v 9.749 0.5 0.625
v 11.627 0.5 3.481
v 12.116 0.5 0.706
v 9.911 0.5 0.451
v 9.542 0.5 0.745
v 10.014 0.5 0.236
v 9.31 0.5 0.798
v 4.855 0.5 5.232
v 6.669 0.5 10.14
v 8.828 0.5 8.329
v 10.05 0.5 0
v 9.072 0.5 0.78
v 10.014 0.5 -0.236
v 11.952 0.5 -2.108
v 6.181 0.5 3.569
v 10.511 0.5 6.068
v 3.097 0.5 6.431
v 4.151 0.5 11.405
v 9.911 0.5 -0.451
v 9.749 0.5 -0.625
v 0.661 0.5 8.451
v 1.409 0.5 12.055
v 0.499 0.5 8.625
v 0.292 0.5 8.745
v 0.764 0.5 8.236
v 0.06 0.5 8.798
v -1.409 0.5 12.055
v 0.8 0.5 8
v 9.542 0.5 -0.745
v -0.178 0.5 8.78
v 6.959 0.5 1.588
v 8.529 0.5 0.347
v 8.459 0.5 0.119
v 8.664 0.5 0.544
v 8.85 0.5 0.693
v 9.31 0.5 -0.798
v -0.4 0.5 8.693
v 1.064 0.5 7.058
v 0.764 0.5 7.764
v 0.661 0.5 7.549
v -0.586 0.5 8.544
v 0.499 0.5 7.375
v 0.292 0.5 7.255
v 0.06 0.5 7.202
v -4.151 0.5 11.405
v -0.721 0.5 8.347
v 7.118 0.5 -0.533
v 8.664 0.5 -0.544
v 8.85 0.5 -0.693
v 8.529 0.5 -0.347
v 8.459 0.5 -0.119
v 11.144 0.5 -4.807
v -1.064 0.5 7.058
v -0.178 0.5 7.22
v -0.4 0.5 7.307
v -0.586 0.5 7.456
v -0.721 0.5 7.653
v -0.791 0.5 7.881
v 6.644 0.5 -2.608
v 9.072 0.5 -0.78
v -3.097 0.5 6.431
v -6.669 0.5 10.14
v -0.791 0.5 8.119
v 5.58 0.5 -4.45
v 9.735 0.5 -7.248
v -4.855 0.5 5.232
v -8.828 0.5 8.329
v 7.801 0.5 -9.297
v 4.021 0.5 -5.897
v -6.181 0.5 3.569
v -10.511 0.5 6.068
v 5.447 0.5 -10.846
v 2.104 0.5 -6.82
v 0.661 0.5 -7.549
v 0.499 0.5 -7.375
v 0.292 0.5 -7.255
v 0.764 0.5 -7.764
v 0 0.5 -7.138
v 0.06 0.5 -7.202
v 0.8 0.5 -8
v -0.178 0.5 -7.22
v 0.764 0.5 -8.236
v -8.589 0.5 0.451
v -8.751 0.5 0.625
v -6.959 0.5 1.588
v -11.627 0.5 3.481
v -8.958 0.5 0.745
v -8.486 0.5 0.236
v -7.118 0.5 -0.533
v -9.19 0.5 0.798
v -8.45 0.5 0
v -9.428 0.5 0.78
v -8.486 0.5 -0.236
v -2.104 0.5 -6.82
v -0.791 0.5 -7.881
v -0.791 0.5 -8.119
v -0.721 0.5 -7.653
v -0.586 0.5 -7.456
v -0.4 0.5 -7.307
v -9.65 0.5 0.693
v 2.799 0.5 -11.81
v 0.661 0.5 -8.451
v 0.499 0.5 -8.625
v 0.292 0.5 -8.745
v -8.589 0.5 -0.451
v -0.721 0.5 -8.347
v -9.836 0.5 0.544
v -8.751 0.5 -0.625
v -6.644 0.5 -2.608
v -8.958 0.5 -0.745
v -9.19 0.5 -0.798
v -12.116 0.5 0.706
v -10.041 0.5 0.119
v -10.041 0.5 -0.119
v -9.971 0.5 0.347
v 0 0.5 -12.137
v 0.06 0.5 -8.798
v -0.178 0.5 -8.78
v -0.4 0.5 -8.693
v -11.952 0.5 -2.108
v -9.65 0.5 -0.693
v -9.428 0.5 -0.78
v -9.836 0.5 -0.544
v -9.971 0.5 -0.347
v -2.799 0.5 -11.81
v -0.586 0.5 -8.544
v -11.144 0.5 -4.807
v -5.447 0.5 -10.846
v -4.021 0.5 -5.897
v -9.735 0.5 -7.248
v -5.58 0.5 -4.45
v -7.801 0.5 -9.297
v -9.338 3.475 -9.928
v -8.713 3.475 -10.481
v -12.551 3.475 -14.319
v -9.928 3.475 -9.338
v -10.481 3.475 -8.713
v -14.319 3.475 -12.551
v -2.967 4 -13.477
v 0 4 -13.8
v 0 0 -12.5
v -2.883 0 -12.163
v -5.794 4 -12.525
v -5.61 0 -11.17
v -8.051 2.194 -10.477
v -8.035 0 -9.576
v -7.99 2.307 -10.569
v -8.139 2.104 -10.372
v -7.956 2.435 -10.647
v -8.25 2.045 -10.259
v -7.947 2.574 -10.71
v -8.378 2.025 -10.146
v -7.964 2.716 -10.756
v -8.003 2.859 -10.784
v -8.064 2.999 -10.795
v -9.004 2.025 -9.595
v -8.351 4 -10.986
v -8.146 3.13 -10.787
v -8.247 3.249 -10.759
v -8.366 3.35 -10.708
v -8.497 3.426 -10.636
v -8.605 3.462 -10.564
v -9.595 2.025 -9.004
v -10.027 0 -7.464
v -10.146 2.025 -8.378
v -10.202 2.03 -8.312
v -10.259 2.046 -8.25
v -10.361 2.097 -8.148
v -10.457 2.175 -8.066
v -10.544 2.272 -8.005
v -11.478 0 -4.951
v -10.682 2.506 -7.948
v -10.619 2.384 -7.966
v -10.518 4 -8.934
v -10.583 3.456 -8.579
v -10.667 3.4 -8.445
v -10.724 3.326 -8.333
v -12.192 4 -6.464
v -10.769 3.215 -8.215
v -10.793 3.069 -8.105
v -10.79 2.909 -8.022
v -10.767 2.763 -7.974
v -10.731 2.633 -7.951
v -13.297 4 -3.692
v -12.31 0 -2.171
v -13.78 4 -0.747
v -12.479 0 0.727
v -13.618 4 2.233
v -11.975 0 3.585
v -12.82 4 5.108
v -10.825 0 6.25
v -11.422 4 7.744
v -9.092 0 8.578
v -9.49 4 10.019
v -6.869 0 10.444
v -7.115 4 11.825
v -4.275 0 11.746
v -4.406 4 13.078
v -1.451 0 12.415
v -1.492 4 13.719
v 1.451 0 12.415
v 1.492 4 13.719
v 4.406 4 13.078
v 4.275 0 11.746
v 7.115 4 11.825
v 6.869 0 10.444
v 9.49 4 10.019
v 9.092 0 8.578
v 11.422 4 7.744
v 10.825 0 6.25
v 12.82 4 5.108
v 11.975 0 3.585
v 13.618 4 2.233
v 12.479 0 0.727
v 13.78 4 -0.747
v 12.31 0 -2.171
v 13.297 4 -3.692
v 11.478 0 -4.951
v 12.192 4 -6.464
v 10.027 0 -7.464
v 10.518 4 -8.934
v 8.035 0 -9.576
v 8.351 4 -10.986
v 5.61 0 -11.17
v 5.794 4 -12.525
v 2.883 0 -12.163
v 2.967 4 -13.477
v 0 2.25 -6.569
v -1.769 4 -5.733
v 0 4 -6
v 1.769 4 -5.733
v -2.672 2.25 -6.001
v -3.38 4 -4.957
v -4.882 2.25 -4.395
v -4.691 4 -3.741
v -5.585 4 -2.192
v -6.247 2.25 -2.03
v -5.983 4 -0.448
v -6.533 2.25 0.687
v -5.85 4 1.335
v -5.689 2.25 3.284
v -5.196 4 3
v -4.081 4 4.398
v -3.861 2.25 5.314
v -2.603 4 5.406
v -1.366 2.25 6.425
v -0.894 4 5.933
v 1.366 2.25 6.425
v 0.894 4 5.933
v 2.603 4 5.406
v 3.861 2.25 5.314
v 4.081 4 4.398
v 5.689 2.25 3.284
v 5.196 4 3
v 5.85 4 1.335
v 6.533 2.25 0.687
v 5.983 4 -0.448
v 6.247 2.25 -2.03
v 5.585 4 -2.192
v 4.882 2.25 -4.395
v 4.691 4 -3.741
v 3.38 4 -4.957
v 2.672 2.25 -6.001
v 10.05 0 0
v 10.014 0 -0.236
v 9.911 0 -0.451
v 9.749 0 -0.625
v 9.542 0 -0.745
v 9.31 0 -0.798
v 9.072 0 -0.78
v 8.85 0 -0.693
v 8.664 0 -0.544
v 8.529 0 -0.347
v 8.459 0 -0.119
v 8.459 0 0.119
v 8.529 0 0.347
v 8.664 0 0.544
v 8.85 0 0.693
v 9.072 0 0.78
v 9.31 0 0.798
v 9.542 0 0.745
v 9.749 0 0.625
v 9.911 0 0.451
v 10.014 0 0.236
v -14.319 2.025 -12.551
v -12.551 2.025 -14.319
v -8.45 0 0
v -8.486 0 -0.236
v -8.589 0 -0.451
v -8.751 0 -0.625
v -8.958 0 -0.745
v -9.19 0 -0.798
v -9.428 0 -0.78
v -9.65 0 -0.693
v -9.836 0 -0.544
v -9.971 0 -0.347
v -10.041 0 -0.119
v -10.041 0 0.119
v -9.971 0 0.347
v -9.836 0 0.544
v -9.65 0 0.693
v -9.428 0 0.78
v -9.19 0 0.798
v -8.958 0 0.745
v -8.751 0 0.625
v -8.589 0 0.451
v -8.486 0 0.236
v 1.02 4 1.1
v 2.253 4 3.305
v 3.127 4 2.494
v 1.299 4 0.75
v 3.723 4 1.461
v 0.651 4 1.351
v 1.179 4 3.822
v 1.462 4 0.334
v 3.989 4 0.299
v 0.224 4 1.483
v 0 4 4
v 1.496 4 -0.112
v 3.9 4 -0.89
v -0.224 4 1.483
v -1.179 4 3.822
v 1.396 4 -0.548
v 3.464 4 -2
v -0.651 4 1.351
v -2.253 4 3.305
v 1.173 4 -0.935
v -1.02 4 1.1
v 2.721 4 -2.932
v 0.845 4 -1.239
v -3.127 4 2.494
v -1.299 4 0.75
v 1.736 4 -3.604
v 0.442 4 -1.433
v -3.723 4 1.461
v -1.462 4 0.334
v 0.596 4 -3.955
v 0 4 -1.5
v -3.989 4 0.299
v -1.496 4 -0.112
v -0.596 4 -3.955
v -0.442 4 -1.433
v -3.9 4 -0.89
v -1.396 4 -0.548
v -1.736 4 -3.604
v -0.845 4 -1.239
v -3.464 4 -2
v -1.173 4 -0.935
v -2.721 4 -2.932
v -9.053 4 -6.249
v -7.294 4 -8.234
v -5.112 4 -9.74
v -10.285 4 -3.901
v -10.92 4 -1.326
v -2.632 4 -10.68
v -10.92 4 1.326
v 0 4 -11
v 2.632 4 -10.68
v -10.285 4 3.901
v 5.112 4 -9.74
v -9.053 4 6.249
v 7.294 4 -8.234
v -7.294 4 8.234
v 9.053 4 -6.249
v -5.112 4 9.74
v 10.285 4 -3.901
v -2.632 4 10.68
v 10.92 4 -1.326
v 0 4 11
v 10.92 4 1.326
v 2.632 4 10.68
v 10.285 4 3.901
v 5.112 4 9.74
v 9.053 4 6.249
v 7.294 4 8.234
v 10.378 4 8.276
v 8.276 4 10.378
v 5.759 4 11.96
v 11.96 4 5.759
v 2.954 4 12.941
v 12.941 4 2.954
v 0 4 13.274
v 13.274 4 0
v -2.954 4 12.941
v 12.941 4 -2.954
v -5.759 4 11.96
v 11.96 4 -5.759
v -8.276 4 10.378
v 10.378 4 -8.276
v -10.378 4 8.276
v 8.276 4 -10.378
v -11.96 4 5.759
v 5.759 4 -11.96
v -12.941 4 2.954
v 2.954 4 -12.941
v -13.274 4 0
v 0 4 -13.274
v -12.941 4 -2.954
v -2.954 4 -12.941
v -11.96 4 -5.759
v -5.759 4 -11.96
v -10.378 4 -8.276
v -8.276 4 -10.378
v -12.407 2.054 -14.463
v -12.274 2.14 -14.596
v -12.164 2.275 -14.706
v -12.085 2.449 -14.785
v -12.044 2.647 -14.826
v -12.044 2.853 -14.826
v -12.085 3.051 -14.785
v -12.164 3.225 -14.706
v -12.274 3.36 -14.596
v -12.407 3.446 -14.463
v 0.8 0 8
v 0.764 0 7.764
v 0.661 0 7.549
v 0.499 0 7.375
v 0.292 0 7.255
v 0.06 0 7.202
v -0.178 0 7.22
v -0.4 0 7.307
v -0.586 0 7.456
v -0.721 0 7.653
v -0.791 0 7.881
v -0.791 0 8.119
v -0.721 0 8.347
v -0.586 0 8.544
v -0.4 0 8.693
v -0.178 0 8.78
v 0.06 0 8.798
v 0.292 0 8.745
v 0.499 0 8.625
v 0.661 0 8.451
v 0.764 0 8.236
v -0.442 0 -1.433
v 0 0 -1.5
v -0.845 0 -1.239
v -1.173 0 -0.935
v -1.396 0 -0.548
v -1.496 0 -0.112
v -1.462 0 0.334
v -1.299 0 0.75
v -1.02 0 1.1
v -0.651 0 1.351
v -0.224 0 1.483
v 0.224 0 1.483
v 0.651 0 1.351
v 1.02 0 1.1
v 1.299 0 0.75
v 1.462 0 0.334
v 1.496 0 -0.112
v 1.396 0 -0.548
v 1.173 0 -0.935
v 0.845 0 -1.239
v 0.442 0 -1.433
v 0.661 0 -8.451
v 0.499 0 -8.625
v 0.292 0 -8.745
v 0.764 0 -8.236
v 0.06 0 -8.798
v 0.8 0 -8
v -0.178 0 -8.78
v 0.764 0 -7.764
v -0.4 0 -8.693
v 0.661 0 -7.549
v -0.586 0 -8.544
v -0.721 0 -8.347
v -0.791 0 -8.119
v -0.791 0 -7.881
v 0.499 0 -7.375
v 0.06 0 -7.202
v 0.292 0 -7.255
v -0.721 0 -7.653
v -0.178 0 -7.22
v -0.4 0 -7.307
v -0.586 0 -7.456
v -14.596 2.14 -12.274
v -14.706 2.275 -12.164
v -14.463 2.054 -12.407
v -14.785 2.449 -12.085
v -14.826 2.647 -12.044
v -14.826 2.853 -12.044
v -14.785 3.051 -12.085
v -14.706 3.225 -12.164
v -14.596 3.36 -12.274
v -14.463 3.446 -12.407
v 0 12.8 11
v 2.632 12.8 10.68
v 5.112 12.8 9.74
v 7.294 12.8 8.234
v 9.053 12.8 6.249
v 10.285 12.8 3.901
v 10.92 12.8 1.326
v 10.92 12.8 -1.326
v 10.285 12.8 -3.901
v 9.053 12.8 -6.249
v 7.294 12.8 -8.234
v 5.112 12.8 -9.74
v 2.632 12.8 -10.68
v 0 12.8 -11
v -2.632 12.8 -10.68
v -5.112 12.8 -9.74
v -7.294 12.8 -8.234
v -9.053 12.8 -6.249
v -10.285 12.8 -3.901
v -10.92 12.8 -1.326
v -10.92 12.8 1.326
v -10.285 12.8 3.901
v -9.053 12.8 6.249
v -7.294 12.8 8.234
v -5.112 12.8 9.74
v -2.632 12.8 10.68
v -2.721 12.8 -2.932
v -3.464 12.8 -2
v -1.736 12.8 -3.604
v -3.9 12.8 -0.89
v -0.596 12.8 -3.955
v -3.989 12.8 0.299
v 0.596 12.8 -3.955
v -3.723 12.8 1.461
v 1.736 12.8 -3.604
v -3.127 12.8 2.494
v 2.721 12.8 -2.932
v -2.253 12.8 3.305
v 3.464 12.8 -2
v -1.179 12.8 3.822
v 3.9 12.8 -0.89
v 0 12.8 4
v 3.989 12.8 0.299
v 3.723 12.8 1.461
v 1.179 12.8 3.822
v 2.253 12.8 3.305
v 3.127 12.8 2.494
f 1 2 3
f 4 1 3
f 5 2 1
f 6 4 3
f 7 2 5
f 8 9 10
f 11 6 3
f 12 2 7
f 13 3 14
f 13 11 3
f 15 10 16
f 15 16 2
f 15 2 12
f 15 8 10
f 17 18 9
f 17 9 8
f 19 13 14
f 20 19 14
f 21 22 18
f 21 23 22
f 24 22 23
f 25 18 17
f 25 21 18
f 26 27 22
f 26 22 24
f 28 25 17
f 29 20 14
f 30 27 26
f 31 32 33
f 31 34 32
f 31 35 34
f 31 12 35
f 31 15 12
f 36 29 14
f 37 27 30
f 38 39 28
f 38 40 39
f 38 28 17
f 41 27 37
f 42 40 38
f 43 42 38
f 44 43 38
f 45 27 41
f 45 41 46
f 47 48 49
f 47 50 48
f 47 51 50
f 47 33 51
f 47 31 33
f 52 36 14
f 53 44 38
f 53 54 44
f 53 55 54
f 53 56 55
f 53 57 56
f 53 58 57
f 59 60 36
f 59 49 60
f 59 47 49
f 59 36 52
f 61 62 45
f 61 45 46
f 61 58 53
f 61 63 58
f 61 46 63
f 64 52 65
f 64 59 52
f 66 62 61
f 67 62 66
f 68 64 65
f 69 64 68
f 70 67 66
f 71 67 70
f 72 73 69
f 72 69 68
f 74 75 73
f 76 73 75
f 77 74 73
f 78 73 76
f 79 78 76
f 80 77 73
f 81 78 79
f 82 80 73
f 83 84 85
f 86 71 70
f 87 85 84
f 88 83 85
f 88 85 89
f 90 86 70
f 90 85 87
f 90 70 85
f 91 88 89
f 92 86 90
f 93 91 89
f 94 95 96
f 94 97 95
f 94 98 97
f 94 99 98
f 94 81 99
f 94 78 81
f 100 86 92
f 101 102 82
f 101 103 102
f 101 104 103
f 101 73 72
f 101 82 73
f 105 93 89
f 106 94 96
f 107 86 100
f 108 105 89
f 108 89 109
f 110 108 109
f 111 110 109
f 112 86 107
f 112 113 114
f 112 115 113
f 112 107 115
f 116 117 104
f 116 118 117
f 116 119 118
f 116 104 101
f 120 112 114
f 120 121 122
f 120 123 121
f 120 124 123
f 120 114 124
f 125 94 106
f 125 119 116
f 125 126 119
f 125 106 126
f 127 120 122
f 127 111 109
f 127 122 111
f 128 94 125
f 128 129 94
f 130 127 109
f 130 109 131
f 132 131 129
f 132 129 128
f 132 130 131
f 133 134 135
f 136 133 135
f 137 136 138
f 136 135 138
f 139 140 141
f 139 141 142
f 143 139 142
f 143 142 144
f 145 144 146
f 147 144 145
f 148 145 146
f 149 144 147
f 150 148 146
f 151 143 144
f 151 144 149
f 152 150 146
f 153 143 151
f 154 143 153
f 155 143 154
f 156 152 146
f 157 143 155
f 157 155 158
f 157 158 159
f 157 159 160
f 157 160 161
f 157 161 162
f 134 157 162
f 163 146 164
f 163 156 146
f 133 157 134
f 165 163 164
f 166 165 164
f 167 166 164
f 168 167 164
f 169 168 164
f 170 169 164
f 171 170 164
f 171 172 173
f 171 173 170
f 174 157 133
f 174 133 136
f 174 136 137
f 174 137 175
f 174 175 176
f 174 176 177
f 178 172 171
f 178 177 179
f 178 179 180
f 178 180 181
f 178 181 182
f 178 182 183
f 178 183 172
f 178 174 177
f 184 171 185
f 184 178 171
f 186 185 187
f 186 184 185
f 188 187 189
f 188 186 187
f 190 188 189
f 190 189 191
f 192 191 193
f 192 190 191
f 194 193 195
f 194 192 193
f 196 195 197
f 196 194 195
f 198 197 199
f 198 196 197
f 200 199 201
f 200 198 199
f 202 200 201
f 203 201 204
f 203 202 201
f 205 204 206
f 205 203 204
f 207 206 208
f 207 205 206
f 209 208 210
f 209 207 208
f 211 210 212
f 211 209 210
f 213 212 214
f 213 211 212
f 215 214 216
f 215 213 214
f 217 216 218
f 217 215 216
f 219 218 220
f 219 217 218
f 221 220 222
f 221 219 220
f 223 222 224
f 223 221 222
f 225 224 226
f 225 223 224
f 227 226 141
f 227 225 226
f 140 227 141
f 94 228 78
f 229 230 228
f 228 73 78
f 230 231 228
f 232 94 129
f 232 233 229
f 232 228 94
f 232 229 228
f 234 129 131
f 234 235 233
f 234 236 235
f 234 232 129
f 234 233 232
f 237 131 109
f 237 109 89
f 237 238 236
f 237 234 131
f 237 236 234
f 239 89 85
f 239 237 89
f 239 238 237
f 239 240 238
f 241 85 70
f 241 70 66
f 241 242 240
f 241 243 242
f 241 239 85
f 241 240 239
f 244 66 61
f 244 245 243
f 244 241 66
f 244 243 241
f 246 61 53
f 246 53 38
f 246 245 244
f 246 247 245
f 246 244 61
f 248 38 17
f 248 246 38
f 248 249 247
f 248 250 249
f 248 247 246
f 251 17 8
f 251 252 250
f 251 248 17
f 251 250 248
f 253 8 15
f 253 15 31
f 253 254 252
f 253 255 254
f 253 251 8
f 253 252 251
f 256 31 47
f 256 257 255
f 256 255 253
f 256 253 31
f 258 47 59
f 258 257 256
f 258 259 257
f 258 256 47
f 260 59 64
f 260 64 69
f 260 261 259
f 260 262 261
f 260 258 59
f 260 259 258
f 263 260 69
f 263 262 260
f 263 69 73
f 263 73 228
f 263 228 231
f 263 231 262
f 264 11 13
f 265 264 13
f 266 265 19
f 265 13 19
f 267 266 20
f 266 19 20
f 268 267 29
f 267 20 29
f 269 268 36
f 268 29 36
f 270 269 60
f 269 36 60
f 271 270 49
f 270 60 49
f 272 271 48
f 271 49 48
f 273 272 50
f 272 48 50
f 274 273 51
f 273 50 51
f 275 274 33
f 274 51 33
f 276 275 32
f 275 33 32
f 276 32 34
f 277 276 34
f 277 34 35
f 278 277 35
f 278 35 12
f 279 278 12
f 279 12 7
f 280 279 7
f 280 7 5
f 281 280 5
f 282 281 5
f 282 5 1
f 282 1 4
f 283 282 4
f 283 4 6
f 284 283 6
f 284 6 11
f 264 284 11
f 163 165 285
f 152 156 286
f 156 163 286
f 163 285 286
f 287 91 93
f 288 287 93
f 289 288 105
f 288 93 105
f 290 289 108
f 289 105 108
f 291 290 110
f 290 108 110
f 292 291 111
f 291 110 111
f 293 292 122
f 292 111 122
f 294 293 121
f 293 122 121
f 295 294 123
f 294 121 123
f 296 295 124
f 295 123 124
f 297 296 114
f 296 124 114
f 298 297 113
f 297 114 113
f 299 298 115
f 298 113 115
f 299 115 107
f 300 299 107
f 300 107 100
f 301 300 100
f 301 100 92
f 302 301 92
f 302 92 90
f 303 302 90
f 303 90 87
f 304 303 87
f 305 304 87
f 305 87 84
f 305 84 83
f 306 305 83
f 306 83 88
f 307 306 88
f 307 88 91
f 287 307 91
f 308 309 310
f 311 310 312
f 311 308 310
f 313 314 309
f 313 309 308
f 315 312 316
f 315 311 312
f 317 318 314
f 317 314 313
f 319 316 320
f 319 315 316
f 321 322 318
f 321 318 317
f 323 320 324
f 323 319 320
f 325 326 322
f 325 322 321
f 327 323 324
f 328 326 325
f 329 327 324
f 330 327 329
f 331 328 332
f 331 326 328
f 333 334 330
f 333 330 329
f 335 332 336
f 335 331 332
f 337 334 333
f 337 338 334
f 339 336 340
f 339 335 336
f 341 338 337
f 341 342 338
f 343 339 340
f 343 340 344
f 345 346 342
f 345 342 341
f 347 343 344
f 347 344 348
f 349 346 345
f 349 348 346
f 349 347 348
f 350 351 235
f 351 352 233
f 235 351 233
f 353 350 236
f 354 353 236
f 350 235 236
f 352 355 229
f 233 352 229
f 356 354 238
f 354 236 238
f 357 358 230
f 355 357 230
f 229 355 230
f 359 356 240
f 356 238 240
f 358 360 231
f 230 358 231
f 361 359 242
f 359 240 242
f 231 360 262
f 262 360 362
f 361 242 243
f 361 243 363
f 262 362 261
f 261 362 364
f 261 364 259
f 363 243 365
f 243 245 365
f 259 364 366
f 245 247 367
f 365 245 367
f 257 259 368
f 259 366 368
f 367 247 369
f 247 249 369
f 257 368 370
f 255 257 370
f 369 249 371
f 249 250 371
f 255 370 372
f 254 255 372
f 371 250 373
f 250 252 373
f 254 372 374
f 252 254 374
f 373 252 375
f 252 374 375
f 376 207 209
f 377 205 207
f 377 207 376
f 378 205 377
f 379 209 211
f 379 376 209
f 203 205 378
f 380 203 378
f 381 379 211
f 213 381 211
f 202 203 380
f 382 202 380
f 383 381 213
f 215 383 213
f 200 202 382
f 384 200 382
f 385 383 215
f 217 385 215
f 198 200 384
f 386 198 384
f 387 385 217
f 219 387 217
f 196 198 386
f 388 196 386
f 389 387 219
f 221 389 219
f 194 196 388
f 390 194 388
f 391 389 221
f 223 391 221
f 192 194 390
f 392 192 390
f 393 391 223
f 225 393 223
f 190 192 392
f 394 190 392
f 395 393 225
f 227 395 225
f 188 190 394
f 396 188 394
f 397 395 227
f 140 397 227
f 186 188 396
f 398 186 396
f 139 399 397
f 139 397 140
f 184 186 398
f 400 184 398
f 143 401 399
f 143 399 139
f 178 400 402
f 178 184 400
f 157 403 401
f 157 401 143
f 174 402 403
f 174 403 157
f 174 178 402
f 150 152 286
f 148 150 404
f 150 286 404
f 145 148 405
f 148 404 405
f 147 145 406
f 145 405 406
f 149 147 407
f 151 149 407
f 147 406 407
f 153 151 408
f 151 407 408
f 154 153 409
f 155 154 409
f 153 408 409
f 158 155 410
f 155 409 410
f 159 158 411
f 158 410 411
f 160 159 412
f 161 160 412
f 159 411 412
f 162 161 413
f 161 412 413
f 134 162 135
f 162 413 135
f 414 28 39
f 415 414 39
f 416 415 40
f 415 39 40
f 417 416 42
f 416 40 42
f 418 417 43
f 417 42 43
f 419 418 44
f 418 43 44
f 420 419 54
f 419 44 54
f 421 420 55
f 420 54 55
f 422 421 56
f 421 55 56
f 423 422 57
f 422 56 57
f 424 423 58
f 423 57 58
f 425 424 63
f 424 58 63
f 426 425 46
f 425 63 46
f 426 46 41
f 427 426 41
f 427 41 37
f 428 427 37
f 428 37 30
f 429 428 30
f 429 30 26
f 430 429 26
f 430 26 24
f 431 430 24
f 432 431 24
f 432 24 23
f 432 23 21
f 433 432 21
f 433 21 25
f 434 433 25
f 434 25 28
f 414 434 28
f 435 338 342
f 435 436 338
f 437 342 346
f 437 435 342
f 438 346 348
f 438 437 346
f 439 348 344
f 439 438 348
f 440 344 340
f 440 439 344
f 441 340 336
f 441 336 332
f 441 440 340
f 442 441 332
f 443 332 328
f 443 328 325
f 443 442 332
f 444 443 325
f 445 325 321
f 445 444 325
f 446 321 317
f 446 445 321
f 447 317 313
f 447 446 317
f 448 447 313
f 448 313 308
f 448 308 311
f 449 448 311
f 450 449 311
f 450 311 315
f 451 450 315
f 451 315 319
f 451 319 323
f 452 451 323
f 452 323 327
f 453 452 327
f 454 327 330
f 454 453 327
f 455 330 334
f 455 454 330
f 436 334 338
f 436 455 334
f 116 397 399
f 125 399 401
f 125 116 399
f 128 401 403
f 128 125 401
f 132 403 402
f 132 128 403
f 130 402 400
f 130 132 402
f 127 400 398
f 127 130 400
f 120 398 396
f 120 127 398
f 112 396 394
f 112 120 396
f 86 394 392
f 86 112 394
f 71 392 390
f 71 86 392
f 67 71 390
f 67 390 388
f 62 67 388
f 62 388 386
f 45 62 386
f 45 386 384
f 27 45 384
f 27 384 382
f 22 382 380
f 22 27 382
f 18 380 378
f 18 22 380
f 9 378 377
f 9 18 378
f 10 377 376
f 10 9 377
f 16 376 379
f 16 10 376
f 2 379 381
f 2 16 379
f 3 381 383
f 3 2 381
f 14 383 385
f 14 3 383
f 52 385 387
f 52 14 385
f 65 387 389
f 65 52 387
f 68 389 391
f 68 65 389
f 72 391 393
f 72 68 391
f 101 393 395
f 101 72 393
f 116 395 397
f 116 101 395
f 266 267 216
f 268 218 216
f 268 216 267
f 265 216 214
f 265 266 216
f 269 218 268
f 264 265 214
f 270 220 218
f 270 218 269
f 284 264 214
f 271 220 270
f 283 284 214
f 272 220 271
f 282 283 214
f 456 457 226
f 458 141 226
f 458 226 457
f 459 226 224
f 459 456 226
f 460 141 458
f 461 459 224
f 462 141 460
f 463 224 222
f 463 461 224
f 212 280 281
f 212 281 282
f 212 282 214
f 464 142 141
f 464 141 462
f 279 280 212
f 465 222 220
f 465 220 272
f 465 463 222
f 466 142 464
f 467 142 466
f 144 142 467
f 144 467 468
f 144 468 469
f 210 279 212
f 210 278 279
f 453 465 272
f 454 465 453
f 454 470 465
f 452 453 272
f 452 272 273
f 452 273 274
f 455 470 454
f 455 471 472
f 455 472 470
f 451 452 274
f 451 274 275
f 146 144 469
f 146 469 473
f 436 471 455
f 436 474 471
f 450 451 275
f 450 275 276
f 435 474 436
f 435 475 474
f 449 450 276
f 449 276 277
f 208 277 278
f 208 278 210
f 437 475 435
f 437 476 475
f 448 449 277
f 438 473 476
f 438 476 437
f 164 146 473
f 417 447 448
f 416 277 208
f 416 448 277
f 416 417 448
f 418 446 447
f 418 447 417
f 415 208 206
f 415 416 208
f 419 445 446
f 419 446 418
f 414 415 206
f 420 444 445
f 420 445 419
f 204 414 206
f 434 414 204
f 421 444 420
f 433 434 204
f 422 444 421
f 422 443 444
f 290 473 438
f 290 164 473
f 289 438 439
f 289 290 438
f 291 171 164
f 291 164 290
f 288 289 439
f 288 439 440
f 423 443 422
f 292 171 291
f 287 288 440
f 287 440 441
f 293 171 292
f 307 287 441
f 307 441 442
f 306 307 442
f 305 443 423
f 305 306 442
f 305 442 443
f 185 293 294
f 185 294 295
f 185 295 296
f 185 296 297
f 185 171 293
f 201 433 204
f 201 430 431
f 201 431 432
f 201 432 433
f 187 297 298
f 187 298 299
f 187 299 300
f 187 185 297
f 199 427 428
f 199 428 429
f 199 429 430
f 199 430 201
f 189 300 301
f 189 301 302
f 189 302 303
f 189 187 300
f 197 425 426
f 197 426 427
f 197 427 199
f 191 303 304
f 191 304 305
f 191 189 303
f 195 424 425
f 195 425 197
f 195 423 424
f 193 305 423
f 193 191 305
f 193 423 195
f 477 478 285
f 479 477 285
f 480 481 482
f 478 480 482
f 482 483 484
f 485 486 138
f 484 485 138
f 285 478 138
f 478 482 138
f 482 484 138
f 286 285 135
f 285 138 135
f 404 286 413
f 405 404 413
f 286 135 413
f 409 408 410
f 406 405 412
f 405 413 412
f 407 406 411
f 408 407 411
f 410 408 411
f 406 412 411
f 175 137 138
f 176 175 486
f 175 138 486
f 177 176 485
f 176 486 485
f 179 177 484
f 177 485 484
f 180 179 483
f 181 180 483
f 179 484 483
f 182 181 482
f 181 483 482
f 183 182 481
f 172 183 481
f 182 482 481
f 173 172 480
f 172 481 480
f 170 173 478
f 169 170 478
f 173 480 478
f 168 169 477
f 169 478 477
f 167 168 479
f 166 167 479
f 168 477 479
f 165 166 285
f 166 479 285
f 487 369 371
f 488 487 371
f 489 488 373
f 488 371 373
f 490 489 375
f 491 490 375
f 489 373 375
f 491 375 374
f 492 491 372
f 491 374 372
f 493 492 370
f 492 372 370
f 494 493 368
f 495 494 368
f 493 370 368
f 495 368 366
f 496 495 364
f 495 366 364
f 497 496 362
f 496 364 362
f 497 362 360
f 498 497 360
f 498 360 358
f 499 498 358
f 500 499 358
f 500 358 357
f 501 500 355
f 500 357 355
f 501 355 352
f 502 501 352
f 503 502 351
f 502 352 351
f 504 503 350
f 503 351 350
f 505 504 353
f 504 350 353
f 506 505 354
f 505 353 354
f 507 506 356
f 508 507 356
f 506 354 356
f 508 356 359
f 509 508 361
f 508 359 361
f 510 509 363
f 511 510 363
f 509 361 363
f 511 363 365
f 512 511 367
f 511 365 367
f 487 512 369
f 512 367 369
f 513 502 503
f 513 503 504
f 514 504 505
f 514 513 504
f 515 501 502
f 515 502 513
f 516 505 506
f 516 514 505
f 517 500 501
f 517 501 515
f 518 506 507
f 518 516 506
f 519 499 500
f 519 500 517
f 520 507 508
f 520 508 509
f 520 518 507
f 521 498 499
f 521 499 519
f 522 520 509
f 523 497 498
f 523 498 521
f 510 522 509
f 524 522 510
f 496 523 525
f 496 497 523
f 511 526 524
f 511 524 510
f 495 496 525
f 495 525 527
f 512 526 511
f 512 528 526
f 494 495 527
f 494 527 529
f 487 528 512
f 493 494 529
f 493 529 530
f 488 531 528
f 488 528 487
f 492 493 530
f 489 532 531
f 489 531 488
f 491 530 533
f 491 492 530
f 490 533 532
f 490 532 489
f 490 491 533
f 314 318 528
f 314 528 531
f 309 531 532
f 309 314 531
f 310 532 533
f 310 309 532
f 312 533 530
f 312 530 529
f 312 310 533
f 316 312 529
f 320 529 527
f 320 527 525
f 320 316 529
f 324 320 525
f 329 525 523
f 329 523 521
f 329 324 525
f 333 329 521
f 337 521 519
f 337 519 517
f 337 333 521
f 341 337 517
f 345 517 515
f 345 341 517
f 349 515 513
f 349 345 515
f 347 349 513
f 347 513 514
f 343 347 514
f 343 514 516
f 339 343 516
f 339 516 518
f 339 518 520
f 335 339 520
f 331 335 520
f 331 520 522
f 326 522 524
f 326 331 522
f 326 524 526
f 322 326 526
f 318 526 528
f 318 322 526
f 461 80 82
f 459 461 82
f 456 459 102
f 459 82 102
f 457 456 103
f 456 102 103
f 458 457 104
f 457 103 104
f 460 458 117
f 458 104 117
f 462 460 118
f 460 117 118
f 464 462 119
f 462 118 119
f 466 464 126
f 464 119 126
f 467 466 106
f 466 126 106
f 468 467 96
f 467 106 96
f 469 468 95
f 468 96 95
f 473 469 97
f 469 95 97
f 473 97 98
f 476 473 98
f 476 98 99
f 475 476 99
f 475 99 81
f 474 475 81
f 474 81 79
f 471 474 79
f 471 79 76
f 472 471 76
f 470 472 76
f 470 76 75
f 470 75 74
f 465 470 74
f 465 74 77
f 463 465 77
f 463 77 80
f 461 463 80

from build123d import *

# Parameters (mm, degrees)
SKETCH2_R                       = 11
SKETCH2_R_2                     = 4
BOSS_EXTRUDE1_DEPTH             = 8.8
M2X0_4_TAPPED_HOLE1_D           = 1.6
M2X0_4_TAPPED_HOLE1_DEPTH       = 0.5
BOSS_EXTRUDE3_START             = 14
BOSS_EXTRUDE3_DEPTH             = 5
BOSS_EXTRUDE3_DIRECTION_2_REACH = 39.339


with BuildPart() as part:
    # Sketch1 → Revolve1 (revolve)
    with BuildSketch(Plane.XY, mode=Mode.PRIVATE) as revolve1_sk:
        Polygon((1.5, 4), (1.5, 0), (12.5, 0), (13.8, 4), (13.274256479, 4), (12.136756479, 0.5), (7.1375, 0.5), (6, 4), align=None)
    revolve(revolve1_sk.sketch.rotate(Axis((0, 0, 0), (0, 1, 0)), 90), axis=Axis((0, 0, 0), (0, 1, 0)))

    # Sketch2 → Boss-Extrude1 (add)
    with BuildSketch(Plane(origin=(0, 4, 0), x_dir=(1, 0, 0), z_dir=(0, 1, 0))):
        with Locations(Location((0, 0, 0), (0, 0, 270))):
            Circle(SKETCH2_R)
        with Locations(Location((0, 0, 0), (0, 0, 270))):
            Circle(SKETCH2_R_2, mode=Mode.SUBTRACT)
    extrude(amount=BOSS_EXTRUDE1_DEPTH)

    # M2x0.4 Tapped Hole1
    with Locations(Plane(origin=(0, 0, 0), x_dir=(-1, 0, 0), z_dir=(0, -1, 0))):
        with Locations((0, 8), (0, -8), (-9.25, 0), (9.25, 0)):
            Hole(M2X0_4_TAPPED_HOLE1_D / 2, depth=M2X0_4_TAPPED_HOLE1_DEPTH)

    # Sketch6 → Boss-Extrude3 (add)
    with BuildSketch(Plane(origin=(0, 0, 0), x_dir=(-0.7071067811865477, 0, 0.7071067811865475), z_dir=(-0.7071067811865475, 0, -0.7071067811865477)).offset(BOSS_EXTRUDE3_START)):
        with BuildLine():
            Line((-1.25, 3.475), (1.25, 3.475))
            ThreePointArc((1.25, 3.475), (1.975, 2.75), (1.25, 2.025))
            Line((1.25, 2.025), (-1.25, 2.025))
            ThreePointArc((-1.25, 2.025), (-1.975, 2.75), (-1.25, 3.475))
        make_face()
    extrude(amount=BOSS_EXTRUDE3_DEPTH)

    # Sketch6 → Boss-Extrude3 direction 2 (add, up to next)
    with BuildSketch(Plane(origin=(0, 0, 0), x_dir=(-0.7071067811865477, 0, 0.7071067811865475), z_dir=(-0.7071067811865475, 0, -0.7071067811865477)).offset(BOSS_EXTRUDE3_START), mode=Mode.PRIVATE) as boss_extrude3_direction_2_sk1:
        with BuildLine():
            Line((-1.25, 3.475), (1.25, 3.475))
            ThreePointArc((1.25, 3.475), (1.975, 2.75), (1.25, 2.025))
            Line((1.25, 2.025), (-1.25, 2.025))
            ThreePointArc((-1.25, 2.025), (-1.975, 2.75), (-1.25, 3.475))
        make_face()
    boss_extrude3_direction_2_tool1 = extrude(boss_extrude3_direction_2_sk1.sketch, amount=-BOSS_EXTRUDE3_DIRECTION_2_REACH, mode=Mode.PRIVATE) - part.part
    add(boss_extrude3_direction_2_tool1.solids().sort_by_distance((-9.899495, 2.75, -9.899495))[0])


solid = part.part
